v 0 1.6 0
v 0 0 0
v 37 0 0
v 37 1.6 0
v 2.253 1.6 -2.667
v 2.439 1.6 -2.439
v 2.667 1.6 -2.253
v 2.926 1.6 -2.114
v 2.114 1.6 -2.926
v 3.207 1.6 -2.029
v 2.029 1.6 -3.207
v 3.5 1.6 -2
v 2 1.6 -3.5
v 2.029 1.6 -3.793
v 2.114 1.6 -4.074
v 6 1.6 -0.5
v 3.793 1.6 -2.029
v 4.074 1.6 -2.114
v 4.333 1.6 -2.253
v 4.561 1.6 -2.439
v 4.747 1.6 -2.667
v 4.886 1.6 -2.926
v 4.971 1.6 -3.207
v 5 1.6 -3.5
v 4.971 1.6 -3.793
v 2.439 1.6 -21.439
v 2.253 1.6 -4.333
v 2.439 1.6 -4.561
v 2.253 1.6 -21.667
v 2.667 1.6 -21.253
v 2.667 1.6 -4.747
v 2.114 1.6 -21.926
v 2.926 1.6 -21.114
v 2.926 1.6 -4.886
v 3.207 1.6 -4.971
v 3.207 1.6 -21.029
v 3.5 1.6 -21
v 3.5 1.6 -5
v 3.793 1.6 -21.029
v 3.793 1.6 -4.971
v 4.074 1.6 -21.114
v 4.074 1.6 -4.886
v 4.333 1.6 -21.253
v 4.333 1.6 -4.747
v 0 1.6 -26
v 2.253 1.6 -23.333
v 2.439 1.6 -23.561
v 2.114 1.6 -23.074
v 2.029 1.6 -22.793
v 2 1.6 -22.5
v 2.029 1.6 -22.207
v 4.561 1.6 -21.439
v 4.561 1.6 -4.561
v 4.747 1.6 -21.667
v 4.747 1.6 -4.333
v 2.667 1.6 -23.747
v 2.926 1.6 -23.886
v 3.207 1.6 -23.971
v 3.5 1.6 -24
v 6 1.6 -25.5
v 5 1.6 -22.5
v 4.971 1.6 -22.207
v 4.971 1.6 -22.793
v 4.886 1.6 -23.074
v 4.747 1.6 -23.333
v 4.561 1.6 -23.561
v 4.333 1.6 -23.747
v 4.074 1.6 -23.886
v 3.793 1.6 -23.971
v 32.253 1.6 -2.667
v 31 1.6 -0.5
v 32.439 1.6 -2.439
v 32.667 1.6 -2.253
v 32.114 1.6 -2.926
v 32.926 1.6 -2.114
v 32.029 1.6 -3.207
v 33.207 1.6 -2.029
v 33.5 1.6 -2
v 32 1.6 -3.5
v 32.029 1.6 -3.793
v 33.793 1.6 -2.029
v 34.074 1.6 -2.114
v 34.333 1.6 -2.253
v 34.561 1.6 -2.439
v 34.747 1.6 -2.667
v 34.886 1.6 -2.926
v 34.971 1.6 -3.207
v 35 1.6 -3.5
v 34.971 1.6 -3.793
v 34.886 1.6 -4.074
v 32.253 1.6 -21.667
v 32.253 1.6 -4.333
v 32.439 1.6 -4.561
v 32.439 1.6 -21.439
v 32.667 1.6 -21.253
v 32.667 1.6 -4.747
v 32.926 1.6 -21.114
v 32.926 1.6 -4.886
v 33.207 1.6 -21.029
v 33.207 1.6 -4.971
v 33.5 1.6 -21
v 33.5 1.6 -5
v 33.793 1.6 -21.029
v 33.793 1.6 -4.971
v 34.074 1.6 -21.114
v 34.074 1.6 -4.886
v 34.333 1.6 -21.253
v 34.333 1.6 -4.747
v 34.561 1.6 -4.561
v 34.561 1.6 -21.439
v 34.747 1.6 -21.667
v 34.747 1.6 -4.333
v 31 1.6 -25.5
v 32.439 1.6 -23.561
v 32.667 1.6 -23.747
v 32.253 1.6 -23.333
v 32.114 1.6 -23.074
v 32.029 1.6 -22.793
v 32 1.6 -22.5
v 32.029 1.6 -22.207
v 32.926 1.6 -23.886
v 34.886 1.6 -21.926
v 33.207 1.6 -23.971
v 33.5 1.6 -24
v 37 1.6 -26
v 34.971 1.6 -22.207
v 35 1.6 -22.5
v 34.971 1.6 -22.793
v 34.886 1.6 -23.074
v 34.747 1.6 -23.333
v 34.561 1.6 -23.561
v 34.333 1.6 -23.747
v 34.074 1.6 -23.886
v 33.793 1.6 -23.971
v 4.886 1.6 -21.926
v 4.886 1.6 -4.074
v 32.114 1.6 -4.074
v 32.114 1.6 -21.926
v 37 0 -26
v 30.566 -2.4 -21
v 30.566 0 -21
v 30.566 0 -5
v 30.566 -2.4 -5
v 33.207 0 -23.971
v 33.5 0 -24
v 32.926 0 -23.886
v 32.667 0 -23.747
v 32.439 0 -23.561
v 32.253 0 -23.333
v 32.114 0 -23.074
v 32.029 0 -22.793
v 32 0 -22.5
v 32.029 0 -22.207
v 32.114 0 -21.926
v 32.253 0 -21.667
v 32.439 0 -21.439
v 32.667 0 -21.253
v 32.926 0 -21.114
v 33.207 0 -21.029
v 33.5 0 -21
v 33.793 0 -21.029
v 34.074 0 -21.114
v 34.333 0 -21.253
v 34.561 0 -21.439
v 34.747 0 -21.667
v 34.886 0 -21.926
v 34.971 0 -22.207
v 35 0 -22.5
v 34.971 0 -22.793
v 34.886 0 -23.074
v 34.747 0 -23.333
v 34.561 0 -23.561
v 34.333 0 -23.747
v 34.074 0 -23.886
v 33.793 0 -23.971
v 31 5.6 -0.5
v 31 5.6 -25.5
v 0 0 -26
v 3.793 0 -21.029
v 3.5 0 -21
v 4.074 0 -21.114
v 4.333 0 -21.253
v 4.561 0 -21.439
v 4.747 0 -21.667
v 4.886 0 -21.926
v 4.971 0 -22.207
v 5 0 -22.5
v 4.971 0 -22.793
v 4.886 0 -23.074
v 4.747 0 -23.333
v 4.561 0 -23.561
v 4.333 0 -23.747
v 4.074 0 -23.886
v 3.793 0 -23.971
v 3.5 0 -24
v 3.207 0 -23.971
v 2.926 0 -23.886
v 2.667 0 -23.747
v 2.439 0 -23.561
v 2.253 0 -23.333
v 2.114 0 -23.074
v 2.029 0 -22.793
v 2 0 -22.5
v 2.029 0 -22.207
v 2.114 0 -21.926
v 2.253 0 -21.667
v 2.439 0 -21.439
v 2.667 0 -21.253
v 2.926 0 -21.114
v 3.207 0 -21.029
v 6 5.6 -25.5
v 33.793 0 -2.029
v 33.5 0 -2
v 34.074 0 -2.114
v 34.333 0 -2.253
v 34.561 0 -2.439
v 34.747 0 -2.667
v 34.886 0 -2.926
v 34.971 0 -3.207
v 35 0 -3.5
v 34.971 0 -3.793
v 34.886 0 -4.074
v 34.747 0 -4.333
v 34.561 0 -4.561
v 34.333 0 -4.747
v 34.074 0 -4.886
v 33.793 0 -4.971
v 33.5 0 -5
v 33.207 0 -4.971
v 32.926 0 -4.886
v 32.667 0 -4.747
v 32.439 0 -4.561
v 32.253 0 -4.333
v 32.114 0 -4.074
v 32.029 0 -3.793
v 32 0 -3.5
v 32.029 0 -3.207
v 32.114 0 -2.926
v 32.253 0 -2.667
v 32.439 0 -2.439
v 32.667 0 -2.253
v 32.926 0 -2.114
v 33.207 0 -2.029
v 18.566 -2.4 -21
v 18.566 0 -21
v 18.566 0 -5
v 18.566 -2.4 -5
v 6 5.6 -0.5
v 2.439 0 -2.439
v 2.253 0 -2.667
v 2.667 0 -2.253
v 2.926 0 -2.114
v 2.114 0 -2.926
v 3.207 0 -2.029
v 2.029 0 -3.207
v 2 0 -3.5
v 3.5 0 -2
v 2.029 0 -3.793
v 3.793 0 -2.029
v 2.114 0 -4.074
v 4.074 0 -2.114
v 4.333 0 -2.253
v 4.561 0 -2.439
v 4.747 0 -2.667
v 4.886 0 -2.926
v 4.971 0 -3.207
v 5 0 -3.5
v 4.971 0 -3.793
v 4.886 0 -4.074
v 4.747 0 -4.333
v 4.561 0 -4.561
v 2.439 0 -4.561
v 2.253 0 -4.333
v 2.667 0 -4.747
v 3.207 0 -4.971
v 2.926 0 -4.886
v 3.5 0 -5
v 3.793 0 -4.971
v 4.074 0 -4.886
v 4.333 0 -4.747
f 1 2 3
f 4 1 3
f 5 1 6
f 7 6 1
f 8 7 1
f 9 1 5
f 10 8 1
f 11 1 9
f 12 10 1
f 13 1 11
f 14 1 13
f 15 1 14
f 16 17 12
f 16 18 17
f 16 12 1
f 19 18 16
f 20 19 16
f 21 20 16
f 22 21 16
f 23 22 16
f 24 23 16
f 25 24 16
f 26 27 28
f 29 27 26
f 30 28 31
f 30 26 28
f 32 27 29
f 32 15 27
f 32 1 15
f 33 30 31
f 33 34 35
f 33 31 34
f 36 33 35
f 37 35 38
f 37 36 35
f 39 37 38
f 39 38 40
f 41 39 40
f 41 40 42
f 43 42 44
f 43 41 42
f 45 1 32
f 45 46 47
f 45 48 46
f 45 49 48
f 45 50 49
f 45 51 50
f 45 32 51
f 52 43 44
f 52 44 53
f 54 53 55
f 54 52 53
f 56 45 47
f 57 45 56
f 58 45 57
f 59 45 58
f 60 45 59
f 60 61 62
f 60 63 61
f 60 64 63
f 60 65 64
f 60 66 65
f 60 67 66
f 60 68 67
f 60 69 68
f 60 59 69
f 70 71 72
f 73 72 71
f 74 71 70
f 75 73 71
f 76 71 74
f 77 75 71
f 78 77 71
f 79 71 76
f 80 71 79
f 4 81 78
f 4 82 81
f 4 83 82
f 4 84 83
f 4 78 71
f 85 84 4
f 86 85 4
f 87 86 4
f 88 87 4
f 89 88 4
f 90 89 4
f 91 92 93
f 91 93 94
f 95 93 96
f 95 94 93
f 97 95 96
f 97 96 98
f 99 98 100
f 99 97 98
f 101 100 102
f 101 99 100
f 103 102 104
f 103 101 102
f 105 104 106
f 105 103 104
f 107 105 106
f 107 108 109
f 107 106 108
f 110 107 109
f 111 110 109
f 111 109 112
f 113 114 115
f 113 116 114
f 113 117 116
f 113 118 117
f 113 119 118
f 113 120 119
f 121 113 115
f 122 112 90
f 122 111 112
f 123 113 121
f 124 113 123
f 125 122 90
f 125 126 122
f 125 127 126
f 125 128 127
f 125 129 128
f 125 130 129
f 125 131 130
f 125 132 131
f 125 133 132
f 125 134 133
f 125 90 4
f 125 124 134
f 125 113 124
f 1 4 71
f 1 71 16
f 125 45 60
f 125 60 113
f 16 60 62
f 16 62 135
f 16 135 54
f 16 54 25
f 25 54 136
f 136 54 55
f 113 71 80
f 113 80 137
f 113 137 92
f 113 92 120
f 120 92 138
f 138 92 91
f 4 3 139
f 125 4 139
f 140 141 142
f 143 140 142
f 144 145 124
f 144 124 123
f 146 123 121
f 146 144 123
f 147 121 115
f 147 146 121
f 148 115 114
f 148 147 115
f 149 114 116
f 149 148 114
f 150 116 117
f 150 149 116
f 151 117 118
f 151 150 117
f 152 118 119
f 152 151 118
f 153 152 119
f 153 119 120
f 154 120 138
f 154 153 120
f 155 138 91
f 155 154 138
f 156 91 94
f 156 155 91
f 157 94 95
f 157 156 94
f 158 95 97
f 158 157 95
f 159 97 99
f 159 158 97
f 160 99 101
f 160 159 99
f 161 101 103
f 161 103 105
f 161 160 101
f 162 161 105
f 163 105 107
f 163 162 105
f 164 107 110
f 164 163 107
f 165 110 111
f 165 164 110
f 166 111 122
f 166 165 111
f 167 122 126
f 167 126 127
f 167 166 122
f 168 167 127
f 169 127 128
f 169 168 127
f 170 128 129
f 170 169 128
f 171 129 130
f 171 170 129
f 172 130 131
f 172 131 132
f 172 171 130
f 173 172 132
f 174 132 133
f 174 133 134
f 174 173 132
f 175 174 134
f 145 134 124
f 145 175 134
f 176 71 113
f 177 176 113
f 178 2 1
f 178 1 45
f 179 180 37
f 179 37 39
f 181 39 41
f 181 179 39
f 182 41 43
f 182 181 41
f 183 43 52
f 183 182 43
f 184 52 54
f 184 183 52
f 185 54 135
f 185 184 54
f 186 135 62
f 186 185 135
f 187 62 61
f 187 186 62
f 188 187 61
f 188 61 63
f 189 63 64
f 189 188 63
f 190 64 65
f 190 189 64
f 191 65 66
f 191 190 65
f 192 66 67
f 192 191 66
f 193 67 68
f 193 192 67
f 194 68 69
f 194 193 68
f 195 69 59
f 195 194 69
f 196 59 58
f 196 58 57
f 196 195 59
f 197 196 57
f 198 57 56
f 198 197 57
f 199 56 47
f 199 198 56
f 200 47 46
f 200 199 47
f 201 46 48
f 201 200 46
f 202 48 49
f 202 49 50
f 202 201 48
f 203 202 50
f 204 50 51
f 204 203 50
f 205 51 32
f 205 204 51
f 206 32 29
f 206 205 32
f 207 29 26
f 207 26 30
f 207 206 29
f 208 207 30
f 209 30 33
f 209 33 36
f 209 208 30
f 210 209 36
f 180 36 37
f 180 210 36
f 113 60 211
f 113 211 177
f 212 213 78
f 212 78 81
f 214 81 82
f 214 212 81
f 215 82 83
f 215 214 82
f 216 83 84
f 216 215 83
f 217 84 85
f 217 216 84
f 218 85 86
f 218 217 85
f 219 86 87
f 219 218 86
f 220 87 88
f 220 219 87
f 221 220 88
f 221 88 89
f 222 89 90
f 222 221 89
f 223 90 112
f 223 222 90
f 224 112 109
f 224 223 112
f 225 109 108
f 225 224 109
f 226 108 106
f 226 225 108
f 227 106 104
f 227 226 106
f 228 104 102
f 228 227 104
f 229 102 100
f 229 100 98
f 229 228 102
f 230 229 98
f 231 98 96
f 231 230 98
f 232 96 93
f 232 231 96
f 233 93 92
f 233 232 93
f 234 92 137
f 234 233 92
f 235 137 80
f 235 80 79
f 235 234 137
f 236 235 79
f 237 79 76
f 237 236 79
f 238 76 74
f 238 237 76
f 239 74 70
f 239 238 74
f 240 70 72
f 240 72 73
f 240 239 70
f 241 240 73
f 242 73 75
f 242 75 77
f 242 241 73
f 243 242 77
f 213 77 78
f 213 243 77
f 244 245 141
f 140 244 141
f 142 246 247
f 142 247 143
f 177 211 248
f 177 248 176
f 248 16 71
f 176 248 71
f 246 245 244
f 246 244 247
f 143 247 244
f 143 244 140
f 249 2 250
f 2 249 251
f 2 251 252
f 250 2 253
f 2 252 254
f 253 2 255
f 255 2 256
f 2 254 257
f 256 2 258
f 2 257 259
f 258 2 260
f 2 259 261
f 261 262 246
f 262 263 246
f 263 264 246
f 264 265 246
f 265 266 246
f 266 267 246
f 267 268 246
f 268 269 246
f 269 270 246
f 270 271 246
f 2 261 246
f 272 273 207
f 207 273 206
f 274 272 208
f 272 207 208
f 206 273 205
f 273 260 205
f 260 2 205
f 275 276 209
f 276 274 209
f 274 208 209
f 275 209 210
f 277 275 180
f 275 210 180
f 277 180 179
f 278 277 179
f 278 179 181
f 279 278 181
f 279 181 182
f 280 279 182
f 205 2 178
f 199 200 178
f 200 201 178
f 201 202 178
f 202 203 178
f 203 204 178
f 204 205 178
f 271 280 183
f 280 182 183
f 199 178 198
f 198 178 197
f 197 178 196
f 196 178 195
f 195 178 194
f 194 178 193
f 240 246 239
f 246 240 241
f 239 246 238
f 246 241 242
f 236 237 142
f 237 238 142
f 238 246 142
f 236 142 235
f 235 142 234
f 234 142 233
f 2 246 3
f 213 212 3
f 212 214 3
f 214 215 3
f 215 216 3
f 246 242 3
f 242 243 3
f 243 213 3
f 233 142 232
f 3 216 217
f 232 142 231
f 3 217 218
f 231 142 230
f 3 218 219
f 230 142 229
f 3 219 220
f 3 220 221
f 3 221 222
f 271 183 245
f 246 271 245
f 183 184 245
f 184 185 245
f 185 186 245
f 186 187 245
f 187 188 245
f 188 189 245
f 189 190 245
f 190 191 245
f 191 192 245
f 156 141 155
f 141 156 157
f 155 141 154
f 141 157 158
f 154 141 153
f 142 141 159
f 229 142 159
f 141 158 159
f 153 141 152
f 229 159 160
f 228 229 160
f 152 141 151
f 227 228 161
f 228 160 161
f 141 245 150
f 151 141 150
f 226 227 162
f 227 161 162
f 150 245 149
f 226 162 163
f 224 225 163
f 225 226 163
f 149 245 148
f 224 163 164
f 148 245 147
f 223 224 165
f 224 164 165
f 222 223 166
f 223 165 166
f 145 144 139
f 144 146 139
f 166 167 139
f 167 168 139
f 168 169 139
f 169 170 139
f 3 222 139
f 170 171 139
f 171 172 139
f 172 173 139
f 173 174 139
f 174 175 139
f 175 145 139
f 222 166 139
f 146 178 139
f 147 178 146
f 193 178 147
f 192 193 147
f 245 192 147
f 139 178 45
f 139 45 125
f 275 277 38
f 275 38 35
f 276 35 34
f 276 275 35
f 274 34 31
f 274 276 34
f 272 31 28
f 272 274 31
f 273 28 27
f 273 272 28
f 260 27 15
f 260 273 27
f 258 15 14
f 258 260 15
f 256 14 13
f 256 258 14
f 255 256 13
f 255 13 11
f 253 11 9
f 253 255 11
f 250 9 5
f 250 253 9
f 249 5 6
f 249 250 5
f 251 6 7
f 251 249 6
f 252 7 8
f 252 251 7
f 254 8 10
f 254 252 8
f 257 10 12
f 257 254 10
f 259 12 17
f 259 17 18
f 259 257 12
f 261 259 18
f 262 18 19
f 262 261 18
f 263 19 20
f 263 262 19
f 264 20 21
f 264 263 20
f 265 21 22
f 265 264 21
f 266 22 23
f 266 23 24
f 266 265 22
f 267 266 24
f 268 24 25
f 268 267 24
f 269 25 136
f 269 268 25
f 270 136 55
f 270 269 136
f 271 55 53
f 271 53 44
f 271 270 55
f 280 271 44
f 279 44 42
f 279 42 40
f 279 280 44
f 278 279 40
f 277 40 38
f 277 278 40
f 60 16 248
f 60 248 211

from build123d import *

# Parameters (mm, degrees)
SKETCH1_W           = 37
SKETCH1_H           = 26
SKETCH1_R           = 1.5
BOSS_EXTRUDE1_DEPTH = 1.6
SKETCH2_W           = 25
SKETCH2_H           = 25
BOSS_EXTRUDE2_DEPTH = 4
SKETCH3_W           = 12
SKETCH3_H           = 16
BOSS_EXTRUDE3_DEPTH = 2.4


with BuildPart() as part:
    # Sketch1 → Boss-Extrude1 (new body)
    with BuildSketch(Plane(origin=(0, 0, 0), x_dir=(1, 0, 0), z_dir=(0, 1, 0))):
        with Locations((18.5, 13)):
            Rectangle(SKETCH1_W, SKETCH1_H)
        with Locations(Location((3.5, 22.5, 0), (0, 0, 270))):
            Circle(SKETCH1_R, mode=Mode.SUBTRACT)
        with Locations(Location((33.5, 22.5, 0), (0, 0, 90))):
            Circle(SKETCH1_R, mode=Mode.SUBTRACT)
        with Locations(Location((33.5, 3.5, 0), (0, 0, 270))):
            Circle(SKETCH1_R, mode=Mode.SUBTRACT)
        with Locations(Location((3.5, 3.5, 0), (0, 0, 90))):
            Circle(SKETCH1_R, mode=Mode.SUBTRACT)
    extrude(amount=BOSS_EXTRUDE1_DEPTH)

    # Sketch2 → Boss-Extrude2 (add)
    with BuildSketch(Plane(origin=(0, 1.6, 0), x_dir=(1, 0, 0), z_dir=(0, 1, 0))):
        with Locations((18.5, 13)):
            Rectangle(SKETCH2_W, SKETCH2_H)
    extrude(amount=BOSS_EXTRUDE2_DEPTH)

    # Sketch3 → Boss-Extrude3 (add)
    with BuildSketch(Plane.XZ):
        with Locations((24.565846611, -13)):
            Rectangle(SKETCH3_W, SKETCH3_H)
    extrude(amount=BOSS_EXTRUDE3_DEPTH)


solid = part.part
